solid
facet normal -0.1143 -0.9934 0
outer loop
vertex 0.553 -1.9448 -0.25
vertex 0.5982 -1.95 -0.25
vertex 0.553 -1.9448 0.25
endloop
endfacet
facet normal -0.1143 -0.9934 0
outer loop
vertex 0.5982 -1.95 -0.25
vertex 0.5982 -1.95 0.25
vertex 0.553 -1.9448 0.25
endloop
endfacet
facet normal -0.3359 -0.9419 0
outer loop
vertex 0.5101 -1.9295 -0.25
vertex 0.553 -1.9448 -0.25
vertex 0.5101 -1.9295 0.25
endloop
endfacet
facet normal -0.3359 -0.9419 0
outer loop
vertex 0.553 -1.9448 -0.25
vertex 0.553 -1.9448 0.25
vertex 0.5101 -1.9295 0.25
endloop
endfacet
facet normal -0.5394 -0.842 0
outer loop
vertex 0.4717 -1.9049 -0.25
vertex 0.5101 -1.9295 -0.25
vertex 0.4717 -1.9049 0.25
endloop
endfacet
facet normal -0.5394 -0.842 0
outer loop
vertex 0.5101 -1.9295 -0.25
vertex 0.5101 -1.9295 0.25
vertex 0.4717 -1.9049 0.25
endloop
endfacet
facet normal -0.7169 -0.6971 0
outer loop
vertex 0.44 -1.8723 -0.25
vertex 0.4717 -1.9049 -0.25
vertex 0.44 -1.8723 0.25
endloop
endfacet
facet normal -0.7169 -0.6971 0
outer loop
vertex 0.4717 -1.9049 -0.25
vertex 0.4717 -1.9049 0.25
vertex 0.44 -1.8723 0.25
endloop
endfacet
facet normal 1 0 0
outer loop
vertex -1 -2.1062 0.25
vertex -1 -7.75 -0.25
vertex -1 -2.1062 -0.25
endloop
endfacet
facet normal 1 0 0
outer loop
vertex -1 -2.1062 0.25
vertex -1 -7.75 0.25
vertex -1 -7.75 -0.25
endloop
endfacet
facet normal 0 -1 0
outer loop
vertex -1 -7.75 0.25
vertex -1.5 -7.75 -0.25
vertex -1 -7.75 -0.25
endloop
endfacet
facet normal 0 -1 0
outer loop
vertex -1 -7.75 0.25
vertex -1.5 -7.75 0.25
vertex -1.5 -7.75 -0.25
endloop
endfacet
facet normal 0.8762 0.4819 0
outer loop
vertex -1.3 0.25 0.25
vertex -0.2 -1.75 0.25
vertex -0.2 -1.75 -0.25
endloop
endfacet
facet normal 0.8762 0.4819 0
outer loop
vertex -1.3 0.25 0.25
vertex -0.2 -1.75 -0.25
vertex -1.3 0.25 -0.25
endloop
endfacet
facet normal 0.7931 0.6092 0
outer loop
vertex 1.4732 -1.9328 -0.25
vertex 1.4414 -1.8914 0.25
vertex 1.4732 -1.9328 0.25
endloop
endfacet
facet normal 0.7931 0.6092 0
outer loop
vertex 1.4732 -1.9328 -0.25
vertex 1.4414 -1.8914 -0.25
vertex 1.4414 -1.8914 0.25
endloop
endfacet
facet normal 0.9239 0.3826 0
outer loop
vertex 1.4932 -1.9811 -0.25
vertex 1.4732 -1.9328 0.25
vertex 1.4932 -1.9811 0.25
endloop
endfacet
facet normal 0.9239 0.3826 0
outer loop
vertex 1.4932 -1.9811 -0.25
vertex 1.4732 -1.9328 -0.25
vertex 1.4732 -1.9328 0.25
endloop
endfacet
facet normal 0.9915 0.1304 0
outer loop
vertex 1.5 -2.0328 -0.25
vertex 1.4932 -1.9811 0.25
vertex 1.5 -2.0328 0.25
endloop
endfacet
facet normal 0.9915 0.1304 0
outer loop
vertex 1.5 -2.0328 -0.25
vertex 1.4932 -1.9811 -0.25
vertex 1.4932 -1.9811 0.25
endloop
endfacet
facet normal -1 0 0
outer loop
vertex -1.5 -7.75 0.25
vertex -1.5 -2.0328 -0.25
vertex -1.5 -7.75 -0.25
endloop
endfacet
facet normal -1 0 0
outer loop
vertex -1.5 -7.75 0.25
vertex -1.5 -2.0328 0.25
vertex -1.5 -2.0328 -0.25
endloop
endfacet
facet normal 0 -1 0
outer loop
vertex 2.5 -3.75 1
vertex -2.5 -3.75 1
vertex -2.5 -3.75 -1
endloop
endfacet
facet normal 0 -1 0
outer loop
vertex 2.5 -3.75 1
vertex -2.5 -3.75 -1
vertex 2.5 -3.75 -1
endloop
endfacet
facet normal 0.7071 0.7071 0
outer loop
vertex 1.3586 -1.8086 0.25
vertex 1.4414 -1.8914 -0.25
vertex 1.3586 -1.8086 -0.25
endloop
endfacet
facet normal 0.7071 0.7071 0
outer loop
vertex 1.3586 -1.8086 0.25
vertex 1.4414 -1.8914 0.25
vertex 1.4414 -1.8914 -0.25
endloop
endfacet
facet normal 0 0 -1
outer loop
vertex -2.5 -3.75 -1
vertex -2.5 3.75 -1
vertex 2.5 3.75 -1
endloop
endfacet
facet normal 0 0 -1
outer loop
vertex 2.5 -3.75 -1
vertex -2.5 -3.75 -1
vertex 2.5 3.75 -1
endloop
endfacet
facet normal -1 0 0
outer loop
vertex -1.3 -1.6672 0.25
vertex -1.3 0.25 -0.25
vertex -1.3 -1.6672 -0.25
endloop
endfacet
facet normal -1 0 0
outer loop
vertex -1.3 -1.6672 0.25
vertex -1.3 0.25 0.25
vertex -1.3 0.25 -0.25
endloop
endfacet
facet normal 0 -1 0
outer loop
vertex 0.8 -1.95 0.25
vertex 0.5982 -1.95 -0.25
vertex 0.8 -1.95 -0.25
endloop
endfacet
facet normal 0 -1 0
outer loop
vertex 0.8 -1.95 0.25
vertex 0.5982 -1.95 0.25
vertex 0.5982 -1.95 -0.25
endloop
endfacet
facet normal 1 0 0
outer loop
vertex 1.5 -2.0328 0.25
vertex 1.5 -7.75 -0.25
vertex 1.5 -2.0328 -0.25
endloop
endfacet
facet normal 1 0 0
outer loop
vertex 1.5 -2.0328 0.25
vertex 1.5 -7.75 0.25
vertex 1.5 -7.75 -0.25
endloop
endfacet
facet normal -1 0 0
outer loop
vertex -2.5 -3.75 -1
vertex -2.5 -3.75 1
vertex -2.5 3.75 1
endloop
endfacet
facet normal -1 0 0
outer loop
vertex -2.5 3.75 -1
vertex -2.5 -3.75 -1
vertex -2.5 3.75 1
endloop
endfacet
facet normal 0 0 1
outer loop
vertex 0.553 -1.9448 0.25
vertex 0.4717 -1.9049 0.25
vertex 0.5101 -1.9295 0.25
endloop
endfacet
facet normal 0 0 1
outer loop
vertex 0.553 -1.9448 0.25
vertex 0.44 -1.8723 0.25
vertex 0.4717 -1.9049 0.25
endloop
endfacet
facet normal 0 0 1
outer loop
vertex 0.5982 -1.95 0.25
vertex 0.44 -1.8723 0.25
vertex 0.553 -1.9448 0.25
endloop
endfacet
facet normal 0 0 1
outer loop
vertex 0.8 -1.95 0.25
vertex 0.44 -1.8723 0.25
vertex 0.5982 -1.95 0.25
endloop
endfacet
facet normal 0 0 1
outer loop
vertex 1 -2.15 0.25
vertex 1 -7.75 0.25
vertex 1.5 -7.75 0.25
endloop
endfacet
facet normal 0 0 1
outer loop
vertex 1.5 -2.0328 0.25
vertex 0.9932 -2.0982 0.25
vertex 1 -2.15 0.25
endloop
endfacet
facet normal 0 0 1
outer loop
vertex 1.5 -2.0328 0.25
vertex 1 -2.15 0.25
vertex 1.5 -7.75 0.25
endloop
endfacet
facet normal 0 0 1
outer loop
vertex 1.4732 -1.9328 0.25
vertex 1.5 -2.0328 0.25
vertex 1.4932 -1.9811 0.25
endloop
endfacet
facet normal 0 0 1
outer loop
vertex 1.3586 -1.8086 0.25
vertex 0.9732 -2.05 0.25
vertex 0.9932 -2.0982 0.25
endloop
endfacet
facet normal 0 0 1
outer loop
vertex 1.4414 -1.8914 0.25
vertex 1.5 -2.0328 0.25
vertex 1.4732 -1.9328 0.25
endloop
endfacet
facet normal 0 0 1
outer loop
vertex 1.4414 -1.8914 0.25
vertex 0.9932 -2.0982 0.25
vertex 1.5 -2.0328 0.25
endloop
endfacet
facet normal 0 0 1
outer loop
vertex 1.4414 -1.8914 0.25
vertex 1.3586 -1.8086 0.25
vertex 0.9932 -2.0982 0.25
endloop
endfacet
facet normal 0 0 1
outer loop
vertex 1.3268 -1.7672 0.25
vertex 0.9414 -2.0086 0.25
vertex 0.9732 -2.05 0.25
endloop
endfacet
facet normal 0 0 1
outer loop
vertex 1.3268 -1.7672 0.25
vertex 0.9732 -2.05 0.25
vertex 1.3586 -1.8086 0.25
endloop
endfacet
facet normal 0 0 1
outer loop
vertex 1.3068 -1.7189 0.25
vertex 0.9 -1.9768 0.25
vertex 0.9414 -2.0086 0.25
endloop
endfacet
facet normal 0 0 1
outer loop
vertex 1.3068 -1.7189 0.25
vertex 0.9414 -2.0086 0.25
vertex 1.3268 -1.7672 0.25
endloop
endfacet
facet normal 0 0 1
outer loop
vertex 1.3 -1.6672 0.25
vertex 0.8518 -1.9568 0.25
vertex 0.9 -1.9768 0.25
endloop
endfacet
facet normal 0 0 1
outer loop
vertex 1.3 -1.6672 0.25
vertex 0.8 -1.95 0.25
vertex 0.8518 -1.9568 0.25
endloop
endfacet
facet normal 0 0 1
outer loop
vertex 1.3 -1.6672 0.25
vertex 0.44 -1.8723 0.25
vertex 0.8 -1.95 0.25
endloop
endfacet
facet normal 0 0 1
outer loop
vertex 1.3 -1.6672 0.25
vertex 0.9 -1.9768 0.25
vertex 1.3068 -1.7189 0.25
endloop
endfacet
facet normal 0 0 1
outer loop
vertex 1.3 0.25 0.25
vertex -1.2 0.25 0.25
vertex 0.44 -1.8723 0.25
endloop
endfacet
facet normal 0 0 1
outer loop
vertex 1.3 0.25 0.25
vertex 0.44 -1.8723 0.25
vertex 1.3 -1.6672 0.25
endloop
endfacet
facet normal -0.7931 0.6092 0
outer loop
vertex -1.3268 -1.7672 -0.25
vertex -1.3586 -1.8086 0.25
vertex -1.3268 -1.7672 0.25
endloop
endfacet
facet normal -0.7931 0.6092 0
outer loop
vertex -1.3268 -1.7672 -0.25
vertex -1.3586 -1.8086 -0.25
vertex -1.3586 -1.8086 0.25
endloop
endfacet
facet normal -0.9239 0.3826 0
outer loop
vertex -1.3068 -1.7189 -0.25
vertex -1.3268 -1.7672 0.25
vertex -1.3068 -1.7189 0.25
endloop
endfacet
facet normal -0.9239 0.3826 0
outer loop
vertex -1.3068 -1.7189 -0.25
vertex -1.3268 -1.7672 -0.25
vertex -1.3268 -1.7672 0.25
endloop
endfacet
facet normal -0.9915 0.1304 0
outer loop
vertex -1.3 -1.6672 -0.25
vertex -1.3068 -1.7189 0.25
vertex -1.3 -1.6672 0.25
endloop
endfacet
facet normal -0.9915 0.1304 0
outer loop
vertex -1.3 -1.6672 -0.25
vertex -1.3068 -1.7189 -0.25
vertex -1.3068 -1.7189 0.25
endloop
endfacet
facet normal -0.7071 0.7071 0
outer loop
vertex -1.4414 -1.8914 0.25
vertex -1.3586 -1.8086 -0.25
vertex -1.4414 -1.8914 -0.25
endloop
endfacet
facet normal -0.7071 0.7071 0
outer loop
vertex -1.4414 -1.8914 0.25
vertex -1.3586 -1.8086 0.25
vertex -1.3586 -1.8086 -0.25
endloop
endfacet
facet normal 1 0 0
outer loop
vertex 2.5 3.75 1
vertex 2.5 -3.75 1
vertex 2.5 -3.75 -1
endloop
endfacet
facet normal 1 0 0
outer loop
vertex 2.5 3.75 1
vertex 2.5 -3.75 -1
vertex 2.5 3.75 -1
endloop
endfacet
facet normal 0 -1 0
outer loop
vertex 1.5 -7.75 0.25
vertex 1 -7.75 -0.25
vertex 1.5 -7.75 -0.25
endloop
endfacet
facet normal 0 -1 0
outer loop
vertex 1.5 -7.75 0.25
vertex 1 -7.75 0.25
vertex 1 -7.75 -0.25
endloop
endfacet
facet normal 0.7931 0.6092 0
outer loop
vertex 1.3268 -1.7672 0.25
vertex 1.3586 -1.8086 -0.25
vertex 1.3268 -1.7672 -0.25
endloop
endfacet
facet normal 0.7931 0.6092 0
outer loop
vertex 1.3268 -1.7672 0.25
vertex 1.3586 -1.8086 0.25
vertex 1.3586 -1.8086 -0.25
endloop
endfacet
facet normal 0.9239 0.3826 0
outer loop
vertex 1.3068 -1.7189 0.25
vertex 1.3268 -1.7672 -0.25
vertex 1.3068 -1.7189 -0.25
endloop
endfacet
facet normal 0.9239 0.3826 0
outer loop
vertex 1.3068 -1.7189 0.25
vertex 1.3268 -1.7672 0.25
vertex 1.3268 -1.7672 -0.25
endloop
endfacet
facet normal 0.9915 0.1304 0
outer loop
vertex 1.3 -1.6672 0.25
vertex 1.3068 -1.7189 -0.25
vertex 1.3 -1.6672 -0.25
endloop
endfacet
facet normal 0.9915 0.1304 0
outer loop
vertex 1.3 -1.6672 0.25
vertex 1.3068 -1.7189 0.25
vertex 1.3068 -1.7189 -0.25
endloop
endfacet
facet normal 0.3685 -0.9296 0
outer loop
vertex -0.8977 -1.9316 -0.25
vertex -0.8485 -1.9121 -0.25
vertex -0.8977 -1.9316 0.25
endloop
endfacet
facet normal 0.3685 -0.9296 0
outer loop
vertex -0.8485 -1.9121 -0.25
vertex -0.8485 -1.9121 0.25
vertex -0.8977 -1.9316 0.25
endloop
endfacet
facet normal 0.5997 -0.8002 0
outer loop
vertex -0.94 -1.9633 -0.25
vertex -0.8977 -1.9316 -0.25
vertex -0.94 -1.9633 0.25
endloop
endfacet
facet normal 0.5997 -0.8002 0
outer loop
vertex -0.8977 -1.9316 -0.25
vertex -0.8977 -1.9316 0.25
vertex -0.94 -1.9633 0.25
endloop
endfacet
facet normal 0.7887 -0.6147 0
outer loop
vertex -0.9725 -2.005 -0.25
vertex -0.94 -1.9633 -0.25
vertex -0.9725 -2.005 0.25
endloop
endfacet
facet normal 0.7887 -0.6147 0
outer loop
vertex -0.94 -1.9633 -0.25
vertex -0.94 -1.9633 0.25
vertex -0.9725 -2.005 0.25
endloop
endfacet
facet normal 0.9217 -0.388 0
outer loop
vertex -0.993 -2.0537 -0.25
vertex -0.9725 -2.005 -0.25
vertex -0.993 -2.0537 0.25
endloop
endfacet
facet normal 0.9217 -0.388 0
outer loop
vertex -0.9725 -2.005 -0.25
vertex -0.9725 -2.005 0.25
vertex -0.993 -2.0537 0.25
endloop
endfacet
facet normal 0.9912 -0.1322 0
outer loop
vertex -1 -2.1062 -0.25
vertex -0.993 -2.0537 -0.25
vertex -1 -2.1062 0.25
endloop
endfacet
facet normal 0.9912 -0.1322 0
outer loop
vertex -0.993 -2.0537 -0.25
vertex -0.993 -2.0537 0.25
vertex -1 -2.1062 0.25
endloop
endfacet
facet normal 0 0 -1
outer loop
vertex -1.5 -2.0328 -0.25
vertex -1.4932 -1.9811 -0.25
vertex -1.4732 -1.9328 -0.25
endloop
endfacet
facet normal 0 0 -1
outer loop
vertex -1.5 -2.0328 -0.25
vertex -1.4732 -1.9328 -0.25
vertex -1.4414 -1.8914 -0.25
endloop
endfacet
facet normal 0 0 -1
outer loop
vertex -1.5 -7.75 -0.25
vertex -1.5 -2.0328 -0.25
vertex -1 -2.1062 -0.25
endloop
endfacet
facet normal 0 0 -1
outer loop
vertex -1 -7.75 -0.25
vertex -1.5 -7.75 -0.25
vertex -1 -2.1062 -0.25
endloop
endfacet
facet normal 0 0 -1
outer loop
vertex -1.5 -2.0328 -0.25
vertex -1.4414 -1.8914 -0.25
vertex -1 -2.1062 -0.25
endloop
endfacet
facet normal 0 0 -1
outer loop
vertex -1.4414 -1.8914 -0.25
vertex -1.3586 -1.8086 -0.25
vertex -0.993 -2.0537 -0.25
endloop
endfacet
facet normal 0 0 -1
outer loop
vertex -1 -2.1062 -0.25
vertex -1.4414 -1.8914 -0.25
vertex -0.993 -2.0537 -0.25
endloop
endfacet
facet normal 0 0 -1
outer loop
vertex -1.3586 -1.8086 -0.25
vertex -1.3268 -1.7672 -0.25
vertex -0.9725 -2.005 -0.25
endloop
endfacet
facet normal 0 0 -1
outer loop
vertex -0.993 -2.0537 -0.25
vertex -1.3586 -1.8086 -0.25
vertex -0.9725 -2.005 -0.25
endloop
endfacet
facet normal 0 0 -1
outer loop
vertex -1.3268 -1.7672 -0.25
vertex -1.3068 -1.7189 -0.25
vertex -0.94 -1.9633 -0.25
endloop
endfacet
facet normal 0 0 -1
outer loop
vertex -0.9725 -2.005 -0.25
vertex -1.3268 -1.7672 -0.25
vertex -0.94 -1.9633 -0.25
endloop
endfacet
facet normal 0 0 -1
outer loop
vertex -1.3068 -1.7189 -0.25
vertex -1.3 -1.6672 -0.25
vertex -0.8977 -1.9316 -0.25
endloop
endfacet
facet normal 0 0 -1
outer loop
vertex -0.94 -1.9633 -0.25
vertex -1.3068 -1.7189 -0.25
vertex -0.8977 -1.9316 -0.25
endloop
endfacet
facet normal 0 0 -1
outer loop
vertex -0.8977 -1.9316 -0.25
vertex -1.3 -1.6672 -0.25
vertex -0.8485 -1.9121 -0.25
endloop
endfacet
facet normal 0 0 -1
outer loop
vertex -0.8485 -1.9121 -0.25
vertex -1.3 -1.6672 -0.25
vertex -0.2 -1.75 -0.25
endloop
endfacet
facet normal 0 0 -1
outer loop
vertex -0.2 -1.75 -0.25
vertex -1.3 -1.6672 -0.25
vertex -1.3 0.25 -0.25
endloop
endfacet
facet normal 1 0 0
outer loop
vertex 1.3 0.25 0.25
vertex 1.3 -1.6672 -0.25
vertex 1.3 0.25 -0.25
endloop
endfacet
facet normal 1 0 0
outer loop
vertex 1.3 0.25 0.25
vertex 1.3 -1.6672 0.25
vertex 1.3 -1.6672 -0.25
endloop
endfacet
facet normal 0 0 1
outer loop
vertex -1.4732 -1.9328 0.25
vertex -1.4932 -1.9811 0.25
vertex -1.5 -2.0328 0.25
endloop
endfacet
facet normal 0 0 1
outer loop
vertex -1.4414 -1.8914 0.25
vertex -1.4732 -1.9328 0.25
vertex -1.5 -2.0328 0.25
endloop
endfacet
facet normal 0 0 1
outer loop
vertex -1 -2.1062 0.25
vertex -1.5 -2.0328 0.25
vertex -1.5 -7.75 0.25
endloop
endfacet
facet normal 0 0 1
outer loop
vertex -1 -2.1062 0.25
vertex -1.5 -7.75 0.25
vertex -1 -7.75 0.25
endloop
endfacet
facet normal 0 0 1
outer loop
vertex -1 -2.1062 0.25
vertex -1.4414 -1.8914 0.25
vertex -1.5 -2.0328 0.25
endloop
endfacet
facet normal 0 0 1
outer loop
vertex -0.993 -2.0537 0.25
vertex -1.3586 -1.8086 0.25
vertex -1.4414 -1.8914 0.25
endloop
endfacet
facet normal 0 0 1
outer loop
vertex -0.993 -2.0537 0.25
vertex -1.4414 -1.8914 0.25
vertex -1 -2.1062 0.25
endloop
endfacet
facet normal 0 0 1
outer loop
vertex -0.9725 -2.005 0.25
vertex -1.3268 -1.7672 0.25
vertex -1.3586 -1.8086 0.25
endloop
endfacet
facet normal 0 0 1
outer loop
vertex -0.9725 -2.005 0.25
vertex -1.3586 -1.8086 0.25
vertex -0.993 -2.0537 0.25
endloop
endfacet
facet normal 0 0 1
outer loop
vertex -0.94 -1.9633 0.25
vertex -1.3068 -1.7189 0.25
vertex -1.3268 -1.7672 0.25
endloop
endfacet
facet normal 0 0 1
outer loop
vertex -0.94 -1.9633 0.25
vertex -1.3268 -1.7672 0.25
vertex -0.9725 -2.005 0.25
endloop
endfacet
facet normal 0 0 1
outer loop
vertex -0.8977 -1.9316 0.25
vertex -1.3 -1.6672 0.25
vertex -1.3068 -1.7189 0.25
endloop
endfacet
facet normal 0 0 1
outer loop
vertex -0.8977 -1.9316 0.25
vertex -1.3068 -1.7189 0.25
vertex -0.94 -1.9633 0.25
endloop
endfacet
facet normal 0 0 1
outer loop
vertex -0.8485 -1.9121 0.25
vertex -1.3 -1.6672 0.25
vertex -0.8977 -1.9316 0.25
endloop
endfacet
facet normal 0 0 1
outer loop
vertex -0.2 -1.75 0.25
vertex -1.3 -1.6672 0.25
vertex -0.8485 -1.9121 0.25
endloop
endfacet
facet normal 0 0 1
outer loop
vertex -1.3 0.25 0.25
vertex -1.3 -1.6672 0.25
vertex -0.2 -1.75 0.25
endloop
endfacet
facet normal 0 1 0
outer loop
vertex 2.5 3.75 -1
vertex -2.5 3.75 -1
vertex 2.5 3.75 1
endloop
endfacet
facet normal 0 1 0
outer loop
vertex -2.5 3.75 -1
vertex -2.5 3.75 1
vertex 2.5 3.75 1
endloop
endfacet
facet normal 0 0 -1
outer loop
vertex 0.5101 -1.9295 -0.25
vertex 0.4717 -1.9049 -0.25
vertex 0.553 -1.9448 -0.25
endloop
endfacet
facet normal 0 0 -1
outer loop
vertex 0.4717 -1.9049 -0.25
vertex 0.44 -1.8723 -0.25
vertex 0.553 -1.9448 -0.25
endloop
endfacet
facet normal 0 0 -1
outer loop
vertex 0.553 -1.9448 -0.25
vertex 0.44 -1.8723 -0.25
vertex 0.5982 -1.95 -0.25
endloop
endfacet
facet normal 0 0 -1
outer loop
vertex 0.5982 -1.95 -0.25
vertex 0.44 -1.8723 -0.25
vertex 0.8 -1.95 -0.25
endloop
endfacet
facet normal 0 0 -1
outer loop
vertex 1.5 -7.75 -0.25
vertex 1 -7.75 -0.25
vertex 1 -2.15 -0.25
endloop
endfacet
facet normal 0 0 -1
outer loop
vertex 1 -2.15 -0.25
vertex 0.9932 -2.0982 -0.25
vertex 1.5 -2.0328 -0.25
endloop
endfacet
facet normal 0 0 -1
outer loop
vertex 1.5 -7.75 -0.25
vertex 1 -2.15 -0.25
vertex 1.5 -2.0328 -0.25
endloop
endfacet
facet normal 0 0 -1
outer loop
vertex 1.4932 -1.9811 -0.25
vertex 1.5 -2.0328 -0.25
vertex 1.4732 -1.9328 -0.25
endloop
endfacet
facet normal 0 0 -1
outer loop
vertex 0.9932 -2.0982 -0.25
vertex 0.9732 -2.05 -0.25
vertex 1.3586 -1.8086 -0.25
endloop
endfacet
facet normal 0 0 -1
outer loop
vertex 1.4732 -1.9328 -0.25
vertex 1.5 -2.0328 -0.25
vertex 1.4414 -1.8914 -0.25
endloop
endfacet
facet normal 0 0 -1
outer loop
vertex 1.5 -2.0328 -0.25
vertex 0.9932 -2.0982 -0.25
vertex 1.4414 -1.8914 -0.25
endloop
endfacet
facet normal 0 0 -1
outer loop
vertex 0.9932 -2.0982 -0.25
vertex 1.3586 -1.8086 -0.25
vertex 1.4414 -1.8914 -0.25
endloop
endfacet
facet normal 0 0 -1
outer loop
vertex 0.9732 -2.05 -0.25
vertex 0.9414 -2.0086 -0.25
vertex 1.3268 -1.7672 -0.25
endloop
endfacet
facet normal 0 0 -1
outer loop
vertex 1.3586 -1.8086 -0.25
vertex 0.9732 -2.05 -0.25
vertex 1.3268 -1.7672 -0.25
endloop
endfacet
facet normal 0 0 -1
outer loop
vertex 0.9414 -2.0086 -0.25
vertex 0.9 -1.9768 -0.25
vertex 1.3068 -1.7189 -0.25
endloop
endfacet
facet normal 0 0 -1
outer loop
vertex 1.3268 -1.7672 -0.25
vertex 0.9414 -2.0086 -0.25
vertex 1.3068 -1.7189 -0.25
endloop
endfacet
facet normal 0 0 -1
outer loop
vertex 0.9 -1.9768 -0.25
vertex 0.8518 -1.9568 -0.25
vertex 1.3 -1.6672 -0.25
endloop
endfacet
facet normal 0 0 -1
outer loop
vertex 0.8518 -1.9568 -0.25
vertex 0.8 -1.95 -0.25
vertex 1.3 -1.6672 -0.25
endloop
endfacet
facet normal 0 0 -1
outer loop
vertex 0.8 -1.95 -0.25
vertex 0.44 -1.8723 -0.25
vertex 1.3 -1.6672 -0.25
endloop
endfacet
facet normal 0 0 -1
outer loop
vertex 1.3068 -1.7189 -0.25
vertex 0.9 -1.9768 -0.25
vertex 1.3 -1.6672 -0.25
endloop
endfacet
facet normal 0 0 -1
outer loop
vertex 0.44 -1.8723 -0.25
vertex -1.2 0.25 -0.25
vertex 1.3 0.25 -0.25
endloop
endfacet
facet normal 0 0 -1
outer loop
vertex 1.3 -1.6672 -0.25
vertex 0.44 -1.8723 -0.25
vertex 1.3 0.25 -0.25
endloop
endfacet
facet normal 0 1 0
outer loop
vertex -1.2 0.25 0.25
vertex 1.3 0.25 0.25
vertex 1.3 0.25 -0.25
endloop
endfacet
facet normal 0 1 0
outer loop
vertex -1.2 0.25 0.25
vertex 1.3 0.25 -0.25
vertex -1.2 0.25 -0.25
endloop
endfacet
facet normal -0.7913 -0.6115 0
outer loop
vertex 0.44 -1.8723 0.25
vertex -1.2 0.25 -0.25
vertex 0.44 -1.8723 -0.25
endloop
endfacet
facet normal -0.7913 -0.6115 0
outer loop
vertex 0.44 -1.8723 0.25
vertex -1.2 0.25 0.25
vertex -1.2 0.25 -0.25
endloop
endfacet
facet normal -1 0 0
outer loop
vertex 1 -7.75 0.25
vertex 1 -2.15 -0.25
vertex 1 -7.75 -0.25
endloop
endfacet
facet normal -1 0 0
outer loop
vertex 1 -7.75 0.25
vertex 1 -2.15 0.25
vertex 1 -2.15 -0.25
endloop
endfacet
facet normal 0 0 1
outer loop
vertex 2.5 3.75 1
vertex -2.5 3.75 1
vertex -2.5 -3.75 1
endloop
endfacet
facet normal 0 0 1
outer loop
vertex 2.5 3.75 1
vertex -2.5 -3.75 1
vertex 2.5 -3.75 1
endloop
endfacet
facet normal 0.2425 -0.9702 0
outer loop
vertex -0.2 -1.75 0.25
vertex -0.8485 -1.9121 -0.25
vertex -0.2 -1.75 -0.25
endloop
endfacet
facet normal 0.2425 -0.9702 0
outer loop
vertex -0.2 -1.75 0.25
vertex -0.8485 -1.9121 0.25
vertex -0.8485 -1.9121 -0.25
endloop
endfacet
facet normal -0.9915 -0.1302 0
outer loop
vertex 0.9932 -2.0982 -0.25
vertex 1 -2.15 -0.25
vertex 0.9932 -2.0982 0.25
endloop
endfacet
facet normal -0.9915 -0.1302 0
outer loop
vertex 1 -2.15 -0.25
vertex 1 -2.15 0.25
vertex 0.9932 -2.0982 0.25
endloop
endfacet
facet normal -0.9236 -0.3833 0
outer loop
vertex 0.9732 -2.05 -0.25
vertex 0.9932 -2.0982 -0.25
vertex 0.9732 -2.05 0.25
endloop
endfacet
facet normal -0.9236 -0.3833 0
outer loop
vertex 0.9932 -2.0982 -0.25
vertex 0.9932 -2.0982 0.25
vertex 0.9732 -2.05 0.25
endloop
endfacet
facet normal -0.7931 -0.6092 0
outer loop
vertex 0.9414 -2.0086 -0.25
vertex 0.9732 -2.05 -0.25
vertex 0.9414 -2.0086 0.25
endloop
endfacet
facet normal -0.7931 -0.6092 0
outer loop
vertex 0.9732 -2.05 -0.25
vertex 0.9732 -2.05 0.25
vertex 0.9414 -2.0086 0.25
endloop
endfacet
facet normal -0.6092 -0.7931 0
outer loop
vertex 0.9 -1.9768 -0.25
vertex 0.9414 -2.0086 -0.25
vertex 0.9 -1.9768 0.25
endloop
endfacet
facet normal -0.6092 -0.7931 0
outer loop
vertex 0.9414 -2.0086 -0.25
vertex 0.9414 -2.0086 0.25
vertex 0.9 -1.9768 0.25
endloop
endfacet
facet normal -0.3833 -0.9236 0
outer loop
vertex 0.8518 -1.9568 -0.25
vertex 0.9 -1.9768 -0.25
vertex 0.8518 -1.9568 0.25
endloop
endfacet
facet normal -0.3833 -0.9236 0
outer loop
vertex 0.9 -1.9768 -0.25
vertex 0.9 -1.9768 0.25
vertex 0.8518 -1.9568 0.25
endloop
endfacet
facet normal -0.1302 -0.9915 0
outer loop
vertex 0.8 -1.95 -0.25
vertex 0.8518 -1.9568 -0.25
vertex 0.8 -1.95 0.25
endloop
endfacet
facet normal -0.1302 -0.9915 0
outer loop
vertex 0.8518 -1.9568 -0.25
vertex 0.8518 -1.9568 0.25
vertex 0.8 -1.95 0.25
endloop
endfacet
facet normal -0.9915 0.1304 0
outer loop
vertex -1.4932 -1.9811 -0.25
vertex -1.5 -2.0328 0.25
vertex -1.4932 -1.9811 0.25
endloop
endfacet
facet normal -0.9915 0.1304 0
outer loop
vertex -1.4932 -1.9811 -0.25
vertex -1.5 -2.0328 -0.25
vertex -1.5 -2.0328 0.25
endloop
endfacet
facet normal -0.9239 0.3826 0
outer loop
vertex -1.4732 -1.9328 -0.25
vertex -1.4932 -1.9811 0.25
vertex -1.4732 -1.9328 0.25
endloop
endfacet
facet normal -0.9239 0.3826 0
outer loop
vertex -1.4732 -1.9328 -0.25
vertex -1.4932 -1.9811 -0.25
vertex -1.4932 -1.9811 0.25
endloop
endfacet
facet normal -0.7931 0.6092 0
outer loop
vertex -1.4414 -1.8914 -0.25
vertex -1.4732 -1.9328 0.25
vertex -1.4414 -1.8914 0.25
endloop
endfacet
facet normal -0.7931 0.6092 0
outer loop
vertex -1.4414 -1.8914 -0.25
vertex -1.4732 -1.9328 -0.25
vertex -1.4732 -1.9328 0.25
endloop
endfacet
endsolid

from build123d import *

# Parameters (mm, degrees)
SKETCH_1_W        = 5
SKETCH_1_H        = 7.5
EXTRUDE_1_DEPTH   = 1
EXTRUDE_2_DEPTH   = 0.25
EXTRUDE_2_2_DEPTH = 0.25
FILLET_1_R        = 0.2
FILLET_2_R        = 0.2


with BuildPart() as part:
    # 草图1 → 凸台-拉伸1 (new, symmetric)
    with BuildSketch(Plane.XY):
        Rectangle(SKETCH_1_W, SKETCH_1_H)
    extrude(amount=EXTRUDE_1_DEPTH, both=True)


with BuildPart() as body_2:
    # 草图3 → 凸台-拉伸2 (new, symmetric)
    with BuildSketch(Plane.XY):
        Polygon((1.5, -3.75), (1.5, -1.95), (1.3, -1.75), (1.3, 0.25), (-1.2, 0.25), (0.5, -1.95), (1, -1.95), (1, -3.75), (1, -7.75), (1.5, -7.75), align=None)
    extrude(amount=EXTRUDE_2_DEPTH, both=True)

    # 圆角1
    fillet_1_edges = [body_2.edges().sort_by_distance(p)[0] for p in [
        (1, -1.95, 0),
        (0.5, -1.95, 0),
        (1.3, -1.75, 0),
        (1.5, -1.95, 0),
    ]]
    fillet(fillet_1_edges, radius=FILLET_1_R)


with BuildPart() as body_3:
    # 草图3 → Extrude 2 2 (new, symmetric)
    with BuildSketch(Plane.XY):
        Polygon((-1.5, -3.75), (-1.5, -7.75), (-1, -7.75), (-1, -3.75), (-1, -1.95), (-0.2, -1.75), (-1.3, 0.25), (-1.3, -1.75), (-1.5, -1.95), align=None)
    extrude(amount=EXTRUDE_2_2_DEPTH, both=True)

    # 圆角2
    fillet_2_edges = [body_3.edges().sort_by_distance(p)[0] for p in [
        (-1, -1.95, 0),
        (-1.5, -1.95, 0),
        (-1.3, -1.75, 0),
    ]]
    fillet(fillet_2_edges, radius=FILLET_2_R)


solid = Compound([part.part, body_2.part, body_3.part])
